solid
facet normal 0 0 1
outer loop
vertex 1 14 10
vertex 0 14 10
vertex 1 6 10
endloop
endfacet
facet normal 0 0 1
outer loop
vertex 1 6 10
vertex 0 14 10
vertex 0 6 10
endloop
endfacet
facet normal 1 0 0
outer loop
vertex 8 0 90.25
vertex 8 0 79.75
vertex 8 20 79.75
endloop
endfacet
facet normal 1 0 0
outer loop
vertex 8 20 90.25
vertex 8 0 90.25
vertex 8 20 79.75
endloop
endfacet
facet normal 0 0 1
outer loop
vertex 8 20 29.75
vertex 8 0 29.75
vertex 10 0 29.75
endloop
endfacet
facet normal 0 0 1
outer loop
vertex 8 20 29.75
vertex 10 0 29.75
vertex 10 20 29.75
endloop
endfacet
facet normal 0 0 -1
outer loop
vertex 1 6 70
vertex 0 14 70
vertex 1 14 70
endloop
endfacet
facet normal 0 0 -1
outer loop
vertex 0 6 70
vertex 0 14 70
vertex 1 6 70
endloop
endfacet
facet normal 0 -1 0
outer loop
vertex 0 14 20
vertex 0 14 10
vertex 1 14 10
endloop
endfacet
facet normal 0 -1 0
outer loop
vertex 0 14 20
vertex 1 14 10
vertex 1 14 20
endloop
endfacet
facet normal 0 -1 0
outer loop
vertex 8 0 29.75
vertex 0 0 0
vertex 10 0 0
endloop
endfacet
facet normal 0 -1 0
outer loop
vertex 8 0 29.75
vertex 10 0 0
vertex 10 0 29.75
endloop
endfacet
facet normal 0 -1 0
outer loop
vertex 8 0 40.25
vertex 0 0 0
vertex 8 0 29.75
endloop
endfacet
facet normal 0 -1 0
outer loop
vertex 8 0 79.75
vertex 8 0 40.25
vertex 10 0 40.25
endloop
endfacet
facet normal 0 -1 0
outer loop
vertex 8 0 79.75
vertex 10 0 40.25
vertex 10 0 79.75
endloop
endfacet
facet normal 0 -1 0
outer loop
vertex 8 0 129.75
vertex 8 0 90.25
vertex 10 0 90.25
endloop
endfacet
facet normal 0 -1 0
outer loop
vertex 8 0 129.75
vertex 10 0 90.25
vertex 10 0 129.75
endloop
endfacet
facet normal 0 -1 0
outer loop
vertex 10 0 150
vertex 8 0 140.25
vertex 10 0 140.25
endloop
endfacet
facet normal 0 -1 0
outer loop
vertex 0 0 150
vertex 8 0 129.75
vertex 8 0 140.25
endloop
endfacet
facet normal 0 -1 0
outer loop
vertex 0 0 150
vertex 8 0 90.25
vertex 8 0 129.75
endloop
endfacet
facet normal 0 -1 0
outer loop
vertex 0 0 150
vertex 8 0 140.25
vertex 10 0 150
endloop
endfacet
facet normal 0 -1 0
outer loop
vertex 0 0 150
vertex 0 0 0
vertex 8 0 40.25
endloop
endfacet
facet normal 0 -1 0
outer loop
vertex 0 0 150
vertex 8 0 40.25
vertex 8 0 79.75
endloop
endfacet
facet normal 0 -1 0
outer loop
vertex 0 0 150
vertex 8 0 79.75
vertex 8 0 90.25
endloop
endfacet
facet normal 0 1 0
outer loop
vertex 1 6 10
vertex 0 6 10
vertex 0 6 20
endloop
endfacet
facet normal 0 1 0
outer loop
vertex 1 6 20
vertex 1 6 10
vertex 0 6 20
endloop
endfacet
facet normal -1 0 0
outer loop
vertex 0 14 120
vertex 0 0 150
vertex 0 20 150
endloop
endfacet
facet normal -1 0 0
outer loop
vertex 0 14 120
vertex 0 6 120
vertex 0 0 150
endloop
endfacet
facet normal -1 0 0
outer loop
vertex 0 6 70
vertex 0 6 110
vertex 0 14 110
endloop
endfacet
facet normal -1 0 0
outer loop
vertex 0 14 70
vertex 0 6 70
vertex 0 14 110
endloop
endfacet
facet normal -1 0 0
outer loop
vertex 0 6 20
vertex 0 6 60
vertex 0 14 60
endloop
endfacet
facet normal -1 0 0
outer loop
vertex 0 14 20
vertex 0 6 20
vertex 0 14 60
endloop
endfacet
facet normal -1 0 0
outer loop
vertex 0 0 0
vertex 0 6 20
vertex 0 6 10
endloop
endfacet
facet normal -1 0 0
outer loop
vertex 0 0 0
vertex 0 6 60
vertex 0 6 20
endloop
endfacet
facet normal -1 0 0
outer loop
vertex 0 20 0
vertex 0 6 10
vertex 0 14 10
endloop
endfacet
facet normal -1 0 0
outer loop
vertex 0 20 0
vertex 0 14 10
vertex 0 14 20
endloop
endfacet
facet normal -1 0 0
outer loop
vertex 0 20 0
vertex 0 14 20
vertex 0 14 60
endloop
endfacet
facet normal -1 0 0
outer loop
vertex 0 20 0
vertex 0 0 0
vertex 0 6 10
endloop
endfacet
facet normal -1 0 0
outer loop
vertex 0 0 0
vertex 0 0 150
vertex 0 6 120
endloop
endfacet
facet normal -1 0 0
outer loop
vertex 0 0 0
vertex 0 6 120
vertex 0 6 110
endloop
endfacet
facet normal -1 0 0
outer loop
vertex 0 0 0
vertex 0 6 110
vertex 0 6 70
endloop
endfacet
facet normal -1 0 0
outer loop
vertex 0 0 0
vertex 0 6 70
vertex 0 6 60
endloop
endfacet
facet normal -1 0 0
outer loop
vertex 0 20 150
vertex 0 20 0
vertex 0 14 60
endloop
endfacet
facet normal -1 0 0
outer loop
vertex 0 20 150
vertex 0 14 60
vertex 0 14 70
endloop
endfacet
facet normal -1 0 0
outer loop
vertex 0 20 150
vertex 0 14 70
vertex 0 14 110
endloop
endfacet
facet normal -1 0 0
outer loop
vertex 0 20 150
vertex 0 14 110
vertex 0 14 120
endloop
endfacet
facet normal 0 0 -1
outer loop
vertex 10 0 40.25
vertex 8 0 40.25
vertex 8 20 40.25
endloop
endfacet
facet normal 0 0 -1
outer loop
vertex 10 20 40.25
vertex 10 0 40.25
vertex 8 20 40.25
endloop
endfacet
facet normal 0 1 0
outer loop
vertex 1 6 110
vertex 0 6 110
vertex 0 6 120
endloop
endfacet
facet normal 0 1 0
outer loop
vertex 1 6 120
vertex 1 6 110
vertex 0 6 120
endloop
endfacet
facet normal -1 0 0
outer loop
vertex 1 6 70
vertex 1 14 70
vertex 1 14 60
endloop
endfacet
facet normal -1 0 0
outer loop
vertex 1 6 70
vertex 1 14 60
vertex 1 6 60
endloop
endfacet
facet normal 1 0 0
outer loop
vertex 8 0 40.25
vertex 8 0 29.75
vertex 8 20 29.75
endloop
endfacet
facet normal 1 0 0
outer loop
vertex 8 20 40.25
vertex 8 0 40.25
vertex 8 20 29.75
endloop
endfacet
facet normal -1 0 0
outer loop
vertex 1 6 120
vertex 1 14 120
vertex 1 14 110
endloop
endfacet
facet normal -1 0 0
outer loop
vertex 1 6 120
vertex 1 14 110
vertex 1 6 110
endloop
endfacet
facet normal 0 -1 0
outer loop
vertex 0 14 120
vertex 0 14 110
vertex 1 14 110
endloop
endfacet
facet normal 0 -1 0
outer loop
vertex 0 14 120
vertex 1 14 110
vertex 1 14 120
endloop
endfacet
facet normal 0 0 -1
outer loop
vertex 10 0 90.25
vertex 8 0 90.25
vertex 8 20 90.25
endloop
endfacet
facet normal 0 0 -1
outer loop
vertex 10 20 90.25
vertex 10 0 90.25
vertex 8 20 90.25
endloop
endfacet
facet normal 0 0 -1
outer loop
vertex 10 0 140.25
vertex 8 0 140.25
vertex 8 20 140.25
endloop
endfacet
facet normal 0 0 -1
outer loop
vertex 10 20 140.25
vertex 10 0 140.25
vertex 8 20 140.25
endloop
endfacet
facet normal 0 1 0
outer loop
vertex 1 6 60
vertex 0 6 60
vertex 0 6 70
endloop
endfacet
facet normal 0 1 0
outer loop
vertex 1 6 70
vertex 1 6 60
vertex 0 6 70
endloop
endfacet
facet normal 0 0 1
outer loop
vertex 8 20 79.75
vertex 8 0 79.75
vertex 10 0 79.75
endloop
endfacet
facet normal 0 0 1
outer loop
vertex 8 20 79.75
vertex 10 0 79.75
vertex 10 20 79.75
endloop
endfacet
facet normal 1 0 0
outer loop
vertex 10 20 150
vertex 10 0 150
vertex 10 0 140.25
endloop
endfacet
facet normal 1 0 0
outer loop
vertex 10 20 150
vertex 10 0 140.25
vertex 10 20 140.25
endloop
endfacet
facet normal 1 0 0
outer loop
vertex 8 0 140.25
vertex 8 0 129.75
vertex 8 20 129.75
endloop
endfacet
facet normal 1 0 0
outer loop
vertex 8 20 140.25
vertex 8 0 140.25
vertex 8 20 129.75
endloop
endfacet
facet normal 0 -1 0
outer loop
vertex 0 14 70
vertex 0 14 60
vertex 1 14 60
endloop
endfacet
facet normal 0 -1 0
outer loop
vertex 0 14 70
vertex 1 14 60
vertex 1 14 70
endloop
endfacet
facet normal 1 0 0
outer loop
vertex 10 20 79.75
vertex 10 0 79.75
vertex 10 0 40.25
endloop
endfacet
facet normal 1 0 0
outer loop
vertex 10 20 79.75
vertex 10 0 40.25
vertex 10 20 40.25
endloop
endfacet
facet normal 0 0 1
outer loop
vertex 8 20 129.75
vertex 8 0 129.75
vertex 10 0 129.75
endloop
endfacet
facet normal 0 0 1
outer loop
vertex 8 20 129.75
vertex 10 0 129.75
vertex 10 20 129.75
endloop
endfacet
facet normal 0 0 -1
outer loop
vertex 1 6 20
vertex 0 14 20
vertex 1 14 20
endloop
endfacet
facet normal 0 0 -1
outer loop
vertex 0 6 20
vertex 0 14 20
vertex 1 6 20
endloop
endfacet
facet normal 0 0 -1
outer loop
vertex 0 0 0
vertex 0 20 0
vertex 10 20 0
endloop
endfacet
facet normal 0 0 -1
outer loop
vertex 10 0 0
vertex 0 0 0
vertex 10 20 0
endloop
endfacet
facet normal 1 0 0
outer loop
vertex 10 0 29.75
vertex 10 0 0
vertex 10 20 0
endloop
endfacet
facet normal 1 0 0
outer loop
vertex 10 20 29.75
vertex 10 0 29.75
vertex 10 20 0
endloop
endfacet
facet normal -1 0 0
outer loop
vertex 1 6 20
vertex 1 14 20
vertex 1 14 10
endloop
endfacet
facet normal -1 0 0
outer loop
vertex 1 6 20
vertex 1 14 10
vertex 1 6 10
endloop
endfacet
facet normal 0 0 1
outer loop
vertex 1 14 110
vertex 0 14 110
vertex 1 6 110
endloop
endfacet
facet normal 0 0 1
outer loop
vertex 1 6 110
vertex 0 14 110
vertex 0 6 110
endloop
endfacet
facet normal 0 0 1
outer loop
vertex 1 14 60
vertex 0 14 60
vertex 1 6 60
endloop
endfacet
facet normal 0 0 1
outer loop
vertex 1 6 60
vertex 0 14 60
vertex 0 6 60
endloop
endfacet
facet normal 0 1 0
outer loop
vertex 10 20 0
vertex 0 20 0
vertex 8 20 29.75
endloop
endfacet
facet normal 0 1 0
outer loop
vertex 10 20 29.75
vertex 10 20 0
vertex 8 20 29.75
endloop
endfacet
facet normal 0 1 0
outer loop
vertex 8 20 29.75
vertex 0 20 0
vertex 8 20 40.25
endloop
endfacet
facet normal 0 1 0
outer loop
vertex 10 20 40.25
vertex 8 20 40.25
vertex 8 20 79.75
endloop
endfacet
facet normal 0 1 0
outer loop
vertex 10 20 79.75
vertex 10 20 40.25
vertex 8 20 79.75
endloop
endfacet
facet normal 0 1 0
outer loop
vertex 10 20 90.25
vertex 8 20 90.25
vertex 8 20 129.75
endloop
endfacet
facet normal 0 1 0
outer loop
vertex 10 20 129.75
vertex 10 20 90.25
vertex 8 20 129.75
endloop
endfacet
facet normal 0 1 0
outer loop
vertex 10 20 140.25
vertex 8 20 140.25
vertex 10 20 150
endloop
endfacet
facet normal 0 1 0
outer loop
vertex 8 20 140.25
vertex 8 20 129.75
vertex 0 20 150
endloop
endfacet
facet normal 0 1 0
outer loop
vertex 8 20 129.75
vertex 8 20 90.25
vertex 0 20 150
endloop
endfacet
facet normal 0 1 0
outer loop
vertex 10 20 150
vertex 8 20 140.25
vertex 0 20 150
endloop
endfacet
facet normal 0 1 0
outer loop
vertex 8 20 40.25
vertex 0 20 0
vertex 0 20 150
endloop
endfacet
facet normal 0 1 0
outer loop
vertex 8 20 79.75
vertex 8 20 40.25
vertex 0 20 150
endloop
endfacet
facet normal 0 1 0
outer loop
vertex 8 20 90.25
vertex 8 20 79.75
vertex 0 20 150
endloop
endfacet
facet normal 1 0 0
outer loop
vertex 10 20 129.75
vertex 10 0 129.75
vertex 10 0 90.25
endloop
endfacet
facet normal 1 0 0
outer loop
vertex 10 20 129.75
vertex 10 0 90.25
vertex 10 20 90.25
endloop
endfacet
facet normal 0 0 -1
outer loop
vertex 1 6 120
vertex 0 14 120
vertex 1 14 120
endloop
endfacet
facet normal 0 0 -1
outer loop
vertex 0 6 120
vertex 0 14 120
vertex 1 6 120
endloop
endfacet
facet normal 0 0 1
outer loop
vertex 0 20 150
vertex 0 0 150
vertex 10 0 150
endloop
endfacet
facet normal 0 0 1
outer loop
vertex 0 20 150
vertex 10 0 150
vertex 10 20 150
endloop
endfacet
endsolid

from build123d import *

# Parameters (mm, degrees)
F0_W     = 8
F0_H     = 20
F1_DEPTH = 150
F2_W     = 20
F2_H     = 9.75
F2_H_2   = 39.5
F2_H_3   = 29.75
F3_DEPTH = 2
F4_W     = 8
F4_H     = 10
F5_DEPTH = 1


with BuildPart() as f1:
    # F0 (on Top) → F1 (new body)
    with BuildSketch(Plane.XY):
        with Locations((4, 10)):
            Rectangle(F0_W, F0_H)
    extrude(amount=F1_DEPTH)

    # F2 (on face) → F3 (join)
    with BuildSketch(Plane.YZ.offset(8)):
        with Locations((10, 145.125)):
            Rectangle(F2_W, F2_H)
        with Locations((10, 110)):
            Rectangle(F2_W, F2_H_2)
        with Locations((10, 60)):
            Rectangle(F2_W, F2_H_2)
        with Locations((10, 14.875)):
            Rectangle(F2_W, F2_H_3)
    extrude(amount=F3_DEPTH)

    # F4 (on face) → F5 (cut)
    with BuildSketch(Plane(origin=(0, 0, 0), x_dir=(0, -1, 0), z_dir=(-1, 0, 0))):
        with Locations((-10, 115)):
            Rectangle(F4_W, F4_H)
        with Locations((-10, 65)):
            Rectangle(F4_W, F4_H)
        with Locations((-10, 15)):
            Rectangle(F4_W, F4_H)
    extrude(amount=-F5_DEPTH, mode=Mode.SUBTRACT)


solid = f1.part
